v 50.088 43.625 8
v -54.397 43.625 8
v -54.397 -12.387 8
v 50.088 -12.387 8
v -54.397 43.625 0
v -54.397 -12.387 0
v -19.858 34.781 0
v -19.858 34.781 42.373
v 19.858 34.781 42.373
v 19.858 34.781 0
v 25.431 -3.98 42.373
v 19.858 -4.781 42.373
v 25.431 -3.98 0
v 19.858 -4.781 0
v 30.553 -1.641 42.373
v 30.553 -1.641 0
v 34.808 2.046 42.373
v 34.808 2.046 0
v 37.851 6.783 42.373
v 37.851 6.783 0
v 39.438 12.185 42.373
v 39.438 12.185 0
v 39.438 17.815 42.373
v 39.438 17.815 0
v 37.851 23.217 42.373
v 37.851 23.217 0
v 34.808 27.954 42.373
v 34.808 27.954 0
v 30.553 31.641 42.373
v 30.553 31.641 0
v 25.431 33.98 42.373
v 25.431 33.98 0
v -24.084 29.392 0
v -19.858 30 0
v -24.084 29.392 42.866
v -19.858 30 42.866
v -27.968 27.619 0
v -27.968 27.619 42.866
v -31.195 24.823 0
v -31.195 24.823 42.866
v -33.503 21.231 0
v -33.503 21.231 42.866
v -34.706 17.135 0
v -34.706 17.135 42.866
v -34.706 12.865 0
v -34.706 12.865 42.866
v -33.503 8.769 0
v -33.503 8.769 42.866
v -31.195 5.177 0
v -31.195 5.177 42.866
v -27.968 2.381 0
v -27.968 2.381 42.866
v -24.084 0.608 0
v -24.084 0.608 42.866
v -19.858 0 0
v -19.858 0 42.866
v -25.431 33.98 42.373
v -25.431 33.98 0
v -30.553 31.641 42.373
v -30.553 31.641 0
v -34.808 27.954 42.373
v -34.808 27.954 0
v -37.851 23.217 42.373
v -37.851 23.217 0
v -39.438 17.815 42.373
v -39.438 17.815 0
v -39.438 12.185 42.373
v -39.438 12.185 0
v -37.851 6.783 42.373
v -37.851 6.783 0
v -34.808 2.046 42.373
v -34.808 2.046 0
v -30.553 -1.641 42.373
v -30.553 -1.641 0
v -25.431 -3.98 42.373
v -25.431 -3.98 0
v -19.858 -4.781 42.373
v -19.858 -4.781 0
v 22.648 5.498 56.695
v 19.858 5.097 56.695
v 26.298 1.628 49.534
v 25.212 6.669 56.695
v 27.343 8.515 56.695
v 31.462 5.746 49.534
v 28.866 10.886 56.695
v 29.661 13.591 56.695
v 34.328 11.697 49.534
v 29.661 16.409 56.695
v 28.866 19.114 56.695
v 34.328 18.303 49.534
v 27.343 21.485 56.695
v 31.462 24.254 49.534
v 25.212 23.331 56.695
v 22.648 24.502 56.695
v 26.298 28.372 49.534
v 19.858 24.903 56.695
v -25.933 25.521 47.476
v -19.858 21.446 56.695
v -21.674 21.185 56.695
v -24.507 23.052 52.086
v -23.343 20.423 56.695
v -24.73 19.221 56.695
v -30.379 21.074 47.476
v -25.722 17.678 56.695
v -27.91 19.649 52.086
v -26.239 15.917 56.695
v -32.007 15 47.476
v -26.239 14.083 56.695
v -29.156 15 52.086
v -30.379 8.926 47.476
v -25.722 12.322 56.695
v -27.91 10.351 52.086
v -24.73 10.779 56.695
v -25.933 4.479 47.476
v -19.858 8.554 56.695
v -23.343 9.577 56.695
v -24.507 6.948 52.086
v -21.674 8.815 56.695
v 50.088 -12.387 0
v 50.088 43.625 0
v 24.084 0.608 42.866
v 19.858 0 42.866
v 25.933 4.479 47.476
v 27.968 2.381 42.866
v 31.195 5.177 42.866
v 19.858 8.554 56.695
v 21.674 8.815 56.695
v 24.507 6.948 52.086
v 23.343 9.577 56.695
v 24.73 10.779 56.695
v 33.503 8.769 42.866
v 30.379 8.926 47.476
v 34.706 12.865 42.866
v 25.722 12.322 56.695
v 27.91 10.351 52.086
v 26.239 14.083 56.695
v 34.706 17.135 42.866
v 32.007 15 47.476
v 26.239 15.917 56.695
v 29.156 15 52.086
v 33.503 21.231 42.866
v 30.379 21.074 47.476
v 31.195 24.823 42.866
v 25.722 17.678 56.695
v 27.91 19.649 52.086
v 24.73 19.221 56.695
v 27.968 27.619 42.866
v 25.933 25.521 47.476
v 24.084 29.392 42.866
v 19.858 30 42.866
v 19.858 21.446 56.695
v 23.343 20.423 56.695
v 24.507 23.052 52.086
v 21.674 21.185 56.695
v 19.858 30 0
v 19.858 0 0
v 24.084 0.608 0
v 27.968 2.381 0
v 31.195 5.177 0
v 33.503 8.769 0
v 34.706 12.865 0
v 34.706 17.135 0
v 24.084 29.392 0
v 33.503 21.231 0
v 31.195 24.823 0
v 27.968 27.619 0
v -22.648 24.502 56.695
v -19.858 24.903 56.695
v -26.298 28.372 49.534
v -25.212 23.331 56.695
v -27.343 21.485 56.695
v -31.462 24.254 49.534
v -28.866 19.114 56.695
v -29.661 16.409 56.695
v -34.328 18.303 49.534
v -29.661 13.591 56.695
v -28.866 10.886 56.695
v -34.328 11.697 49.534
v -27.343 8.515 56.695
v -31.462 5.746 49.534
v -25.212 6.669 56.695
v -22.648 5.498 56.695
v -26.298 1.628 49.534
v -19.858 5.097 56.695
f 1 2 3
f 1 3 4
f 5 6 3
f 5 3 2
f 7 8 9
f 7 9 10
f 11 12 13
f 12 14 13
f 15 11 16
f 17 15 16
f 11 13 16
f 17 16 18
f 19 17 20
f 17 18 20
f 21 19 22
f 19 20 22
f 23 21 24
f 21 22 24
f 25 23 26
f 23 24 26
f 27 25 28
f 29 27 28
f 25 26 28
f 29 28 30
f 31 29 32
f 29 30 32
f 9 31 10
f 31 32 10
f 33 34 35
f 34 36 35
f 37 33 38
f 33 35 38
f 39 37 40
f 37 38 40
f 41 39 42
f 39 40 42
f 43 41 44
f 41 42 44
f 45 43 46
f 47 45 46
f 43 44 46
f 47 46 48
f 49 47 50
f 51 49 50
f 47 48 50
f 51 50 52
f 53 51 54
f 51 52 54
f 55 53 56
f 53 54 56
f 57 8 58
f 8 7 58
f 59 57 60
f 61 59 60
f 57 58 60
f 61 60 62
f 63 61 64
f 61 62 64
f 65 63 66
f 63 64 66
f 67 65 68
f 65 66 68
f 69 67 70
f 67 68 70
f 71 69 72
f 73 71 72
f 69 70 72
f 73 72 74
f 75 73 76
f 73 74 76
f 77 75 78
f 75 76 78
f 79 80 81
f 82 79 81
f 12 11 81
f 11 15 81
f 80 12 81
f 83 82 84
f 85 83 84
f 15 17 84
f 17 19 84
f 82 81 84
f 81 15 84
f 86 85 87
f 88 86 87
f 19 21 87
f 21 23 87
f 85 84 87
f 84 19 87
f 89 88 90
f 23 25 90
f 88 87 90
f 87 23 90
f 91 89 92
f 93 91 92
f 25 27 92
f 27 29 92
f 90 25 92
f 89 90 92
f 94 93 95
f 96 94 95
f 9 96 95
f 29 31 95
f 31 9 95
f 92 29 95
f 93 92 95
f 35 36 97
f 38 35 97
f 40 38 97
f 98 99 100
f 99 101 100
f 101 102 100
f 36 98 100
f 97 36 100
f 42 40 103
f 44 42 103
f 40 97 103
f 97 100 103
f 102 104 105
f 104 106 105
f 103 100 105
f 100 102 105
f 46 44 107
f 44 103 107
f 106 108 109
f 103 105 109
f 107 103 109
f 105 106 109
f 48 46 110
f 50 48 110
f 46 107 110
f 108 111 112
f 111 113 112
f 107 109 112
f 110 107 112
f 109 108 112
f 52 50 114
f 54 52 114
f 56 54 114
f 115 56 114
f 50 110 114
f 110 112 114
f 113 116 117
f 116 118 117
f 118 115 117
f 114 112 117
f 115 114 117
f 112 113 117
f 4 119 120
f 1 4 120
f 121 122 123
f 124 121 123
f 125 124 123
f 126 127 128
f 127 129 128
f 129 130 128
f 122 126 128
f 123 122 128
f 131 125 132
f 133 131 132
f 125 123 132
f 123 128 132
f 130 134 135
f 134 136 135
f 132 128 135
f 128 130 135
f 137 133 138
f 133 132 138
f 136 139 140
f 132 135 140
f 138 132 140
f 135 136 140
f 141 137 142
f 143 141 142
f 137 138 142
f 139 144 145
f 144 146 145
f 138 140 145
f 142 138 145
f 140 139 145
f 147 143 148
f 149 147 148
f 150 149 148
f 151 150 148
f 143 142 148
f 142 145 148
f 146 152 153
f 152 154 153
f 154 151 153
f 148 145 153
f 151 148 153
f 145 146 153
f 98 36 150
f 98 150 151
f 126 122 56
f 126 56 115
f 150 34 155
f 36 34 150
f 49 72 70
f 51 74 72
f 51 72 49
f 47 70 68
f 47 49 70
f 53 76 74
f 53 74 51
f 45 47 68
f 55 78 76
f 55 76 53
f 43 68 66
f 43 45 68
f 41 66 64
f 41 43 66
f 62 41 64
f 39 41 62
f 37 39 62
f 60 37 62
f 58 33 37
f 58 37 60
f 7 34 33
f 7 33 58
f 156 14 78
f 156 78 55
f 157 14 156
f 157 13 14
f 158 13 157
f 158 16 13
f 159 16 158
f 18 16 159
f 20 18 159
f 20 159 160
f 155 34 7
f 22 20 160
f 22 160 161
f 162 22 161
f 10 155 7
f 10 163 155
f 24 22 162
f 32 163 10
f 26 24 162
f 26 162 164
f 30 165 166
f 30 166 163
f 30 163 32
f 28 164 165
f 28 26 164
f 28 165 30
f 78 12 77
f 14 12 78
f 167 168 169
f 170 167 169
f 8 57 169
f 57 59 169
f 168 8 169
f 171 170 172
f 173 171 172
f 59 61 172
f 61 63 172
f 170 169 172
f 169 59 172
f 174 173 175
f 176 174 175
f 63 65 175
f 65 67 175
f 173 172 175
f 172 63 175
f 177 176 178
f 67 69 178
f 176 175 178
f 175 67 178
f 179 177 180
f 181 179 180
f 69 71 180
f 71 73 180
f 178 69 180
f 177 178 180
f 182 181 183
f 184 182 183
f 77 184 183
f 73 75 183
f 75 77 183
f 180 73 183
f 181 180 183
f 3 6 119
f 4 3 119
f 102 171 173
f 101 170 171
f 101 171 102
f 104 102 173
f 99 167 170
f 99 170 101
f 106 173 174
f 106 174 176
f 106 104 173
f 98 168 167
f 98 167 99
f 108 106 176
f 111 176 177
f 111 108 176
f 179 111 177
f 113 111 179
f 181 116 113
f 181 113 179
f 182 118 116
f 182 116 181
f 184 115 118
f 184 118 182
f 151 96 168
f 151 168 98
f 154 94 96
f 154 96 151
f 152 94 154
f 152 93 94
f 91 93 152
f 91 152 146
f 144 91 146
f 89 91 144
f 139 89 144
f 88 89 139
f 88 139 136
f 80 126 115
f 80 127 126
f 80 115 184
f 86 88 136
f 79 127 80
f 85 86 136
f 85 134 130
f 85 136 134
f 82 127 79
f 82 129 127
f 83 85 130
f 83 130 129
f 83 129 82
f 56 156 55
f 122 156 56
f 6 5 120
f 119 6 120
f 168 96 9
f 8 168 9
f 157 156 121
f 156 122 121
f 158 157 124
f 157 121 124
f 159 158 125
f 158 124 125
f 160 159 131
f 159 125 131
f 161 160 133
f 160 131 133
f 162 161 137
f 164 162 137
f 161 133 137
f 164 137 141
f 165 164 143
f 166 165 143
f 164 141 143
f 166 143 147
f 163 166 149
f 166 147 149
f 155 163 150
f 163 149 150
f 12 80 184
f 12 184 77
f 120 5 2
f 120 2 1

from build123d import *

# Parameters (mm, degrees)
F3_W     = 104.485452
F3_H     = 56.012825
F4_DEPTH = 8


with BuildPart() as f2:
    # F2: sweep along a path in F0
    with BuildLine(Plane.XY) as f2_path:
        Line((-19.858262, 0), (0, 0))
        Line((0, 0), (19.858262, 0))
        ThreePointArc((19.858262, 0), (34.858262, 15), (19.858262, 30))
        Line((19.858262, 30), (0, 30))
        Line((0, 30), (-19.858262, 30))
        ThreePointArc((-19.858262, 30), (-34.858262, 15), (-19.858262, 0))
    # F1 (on Right) → F2 (sweep)
    with BuildSketch(Plane.YZ):
        Polygon((0, 0), (0, 42.866446), (8.554096, 56.695212), (5.096905, 56.695212), (-4.780783, 42.372562), (-4.780783, 0), align=None)
    sweep(path=f2_path.line)


with BuildPart() as f4:
    # F3 (on Top) → F4 (new body)
    with BuildSketch(Plane.XY):
        with Locations((-2.154335, 15.618965)):
            Rectangle(F3_W, F3_H)
    extrude(amount=F4_DEPTH)


solid = Compound([f2.part, f4.part])
